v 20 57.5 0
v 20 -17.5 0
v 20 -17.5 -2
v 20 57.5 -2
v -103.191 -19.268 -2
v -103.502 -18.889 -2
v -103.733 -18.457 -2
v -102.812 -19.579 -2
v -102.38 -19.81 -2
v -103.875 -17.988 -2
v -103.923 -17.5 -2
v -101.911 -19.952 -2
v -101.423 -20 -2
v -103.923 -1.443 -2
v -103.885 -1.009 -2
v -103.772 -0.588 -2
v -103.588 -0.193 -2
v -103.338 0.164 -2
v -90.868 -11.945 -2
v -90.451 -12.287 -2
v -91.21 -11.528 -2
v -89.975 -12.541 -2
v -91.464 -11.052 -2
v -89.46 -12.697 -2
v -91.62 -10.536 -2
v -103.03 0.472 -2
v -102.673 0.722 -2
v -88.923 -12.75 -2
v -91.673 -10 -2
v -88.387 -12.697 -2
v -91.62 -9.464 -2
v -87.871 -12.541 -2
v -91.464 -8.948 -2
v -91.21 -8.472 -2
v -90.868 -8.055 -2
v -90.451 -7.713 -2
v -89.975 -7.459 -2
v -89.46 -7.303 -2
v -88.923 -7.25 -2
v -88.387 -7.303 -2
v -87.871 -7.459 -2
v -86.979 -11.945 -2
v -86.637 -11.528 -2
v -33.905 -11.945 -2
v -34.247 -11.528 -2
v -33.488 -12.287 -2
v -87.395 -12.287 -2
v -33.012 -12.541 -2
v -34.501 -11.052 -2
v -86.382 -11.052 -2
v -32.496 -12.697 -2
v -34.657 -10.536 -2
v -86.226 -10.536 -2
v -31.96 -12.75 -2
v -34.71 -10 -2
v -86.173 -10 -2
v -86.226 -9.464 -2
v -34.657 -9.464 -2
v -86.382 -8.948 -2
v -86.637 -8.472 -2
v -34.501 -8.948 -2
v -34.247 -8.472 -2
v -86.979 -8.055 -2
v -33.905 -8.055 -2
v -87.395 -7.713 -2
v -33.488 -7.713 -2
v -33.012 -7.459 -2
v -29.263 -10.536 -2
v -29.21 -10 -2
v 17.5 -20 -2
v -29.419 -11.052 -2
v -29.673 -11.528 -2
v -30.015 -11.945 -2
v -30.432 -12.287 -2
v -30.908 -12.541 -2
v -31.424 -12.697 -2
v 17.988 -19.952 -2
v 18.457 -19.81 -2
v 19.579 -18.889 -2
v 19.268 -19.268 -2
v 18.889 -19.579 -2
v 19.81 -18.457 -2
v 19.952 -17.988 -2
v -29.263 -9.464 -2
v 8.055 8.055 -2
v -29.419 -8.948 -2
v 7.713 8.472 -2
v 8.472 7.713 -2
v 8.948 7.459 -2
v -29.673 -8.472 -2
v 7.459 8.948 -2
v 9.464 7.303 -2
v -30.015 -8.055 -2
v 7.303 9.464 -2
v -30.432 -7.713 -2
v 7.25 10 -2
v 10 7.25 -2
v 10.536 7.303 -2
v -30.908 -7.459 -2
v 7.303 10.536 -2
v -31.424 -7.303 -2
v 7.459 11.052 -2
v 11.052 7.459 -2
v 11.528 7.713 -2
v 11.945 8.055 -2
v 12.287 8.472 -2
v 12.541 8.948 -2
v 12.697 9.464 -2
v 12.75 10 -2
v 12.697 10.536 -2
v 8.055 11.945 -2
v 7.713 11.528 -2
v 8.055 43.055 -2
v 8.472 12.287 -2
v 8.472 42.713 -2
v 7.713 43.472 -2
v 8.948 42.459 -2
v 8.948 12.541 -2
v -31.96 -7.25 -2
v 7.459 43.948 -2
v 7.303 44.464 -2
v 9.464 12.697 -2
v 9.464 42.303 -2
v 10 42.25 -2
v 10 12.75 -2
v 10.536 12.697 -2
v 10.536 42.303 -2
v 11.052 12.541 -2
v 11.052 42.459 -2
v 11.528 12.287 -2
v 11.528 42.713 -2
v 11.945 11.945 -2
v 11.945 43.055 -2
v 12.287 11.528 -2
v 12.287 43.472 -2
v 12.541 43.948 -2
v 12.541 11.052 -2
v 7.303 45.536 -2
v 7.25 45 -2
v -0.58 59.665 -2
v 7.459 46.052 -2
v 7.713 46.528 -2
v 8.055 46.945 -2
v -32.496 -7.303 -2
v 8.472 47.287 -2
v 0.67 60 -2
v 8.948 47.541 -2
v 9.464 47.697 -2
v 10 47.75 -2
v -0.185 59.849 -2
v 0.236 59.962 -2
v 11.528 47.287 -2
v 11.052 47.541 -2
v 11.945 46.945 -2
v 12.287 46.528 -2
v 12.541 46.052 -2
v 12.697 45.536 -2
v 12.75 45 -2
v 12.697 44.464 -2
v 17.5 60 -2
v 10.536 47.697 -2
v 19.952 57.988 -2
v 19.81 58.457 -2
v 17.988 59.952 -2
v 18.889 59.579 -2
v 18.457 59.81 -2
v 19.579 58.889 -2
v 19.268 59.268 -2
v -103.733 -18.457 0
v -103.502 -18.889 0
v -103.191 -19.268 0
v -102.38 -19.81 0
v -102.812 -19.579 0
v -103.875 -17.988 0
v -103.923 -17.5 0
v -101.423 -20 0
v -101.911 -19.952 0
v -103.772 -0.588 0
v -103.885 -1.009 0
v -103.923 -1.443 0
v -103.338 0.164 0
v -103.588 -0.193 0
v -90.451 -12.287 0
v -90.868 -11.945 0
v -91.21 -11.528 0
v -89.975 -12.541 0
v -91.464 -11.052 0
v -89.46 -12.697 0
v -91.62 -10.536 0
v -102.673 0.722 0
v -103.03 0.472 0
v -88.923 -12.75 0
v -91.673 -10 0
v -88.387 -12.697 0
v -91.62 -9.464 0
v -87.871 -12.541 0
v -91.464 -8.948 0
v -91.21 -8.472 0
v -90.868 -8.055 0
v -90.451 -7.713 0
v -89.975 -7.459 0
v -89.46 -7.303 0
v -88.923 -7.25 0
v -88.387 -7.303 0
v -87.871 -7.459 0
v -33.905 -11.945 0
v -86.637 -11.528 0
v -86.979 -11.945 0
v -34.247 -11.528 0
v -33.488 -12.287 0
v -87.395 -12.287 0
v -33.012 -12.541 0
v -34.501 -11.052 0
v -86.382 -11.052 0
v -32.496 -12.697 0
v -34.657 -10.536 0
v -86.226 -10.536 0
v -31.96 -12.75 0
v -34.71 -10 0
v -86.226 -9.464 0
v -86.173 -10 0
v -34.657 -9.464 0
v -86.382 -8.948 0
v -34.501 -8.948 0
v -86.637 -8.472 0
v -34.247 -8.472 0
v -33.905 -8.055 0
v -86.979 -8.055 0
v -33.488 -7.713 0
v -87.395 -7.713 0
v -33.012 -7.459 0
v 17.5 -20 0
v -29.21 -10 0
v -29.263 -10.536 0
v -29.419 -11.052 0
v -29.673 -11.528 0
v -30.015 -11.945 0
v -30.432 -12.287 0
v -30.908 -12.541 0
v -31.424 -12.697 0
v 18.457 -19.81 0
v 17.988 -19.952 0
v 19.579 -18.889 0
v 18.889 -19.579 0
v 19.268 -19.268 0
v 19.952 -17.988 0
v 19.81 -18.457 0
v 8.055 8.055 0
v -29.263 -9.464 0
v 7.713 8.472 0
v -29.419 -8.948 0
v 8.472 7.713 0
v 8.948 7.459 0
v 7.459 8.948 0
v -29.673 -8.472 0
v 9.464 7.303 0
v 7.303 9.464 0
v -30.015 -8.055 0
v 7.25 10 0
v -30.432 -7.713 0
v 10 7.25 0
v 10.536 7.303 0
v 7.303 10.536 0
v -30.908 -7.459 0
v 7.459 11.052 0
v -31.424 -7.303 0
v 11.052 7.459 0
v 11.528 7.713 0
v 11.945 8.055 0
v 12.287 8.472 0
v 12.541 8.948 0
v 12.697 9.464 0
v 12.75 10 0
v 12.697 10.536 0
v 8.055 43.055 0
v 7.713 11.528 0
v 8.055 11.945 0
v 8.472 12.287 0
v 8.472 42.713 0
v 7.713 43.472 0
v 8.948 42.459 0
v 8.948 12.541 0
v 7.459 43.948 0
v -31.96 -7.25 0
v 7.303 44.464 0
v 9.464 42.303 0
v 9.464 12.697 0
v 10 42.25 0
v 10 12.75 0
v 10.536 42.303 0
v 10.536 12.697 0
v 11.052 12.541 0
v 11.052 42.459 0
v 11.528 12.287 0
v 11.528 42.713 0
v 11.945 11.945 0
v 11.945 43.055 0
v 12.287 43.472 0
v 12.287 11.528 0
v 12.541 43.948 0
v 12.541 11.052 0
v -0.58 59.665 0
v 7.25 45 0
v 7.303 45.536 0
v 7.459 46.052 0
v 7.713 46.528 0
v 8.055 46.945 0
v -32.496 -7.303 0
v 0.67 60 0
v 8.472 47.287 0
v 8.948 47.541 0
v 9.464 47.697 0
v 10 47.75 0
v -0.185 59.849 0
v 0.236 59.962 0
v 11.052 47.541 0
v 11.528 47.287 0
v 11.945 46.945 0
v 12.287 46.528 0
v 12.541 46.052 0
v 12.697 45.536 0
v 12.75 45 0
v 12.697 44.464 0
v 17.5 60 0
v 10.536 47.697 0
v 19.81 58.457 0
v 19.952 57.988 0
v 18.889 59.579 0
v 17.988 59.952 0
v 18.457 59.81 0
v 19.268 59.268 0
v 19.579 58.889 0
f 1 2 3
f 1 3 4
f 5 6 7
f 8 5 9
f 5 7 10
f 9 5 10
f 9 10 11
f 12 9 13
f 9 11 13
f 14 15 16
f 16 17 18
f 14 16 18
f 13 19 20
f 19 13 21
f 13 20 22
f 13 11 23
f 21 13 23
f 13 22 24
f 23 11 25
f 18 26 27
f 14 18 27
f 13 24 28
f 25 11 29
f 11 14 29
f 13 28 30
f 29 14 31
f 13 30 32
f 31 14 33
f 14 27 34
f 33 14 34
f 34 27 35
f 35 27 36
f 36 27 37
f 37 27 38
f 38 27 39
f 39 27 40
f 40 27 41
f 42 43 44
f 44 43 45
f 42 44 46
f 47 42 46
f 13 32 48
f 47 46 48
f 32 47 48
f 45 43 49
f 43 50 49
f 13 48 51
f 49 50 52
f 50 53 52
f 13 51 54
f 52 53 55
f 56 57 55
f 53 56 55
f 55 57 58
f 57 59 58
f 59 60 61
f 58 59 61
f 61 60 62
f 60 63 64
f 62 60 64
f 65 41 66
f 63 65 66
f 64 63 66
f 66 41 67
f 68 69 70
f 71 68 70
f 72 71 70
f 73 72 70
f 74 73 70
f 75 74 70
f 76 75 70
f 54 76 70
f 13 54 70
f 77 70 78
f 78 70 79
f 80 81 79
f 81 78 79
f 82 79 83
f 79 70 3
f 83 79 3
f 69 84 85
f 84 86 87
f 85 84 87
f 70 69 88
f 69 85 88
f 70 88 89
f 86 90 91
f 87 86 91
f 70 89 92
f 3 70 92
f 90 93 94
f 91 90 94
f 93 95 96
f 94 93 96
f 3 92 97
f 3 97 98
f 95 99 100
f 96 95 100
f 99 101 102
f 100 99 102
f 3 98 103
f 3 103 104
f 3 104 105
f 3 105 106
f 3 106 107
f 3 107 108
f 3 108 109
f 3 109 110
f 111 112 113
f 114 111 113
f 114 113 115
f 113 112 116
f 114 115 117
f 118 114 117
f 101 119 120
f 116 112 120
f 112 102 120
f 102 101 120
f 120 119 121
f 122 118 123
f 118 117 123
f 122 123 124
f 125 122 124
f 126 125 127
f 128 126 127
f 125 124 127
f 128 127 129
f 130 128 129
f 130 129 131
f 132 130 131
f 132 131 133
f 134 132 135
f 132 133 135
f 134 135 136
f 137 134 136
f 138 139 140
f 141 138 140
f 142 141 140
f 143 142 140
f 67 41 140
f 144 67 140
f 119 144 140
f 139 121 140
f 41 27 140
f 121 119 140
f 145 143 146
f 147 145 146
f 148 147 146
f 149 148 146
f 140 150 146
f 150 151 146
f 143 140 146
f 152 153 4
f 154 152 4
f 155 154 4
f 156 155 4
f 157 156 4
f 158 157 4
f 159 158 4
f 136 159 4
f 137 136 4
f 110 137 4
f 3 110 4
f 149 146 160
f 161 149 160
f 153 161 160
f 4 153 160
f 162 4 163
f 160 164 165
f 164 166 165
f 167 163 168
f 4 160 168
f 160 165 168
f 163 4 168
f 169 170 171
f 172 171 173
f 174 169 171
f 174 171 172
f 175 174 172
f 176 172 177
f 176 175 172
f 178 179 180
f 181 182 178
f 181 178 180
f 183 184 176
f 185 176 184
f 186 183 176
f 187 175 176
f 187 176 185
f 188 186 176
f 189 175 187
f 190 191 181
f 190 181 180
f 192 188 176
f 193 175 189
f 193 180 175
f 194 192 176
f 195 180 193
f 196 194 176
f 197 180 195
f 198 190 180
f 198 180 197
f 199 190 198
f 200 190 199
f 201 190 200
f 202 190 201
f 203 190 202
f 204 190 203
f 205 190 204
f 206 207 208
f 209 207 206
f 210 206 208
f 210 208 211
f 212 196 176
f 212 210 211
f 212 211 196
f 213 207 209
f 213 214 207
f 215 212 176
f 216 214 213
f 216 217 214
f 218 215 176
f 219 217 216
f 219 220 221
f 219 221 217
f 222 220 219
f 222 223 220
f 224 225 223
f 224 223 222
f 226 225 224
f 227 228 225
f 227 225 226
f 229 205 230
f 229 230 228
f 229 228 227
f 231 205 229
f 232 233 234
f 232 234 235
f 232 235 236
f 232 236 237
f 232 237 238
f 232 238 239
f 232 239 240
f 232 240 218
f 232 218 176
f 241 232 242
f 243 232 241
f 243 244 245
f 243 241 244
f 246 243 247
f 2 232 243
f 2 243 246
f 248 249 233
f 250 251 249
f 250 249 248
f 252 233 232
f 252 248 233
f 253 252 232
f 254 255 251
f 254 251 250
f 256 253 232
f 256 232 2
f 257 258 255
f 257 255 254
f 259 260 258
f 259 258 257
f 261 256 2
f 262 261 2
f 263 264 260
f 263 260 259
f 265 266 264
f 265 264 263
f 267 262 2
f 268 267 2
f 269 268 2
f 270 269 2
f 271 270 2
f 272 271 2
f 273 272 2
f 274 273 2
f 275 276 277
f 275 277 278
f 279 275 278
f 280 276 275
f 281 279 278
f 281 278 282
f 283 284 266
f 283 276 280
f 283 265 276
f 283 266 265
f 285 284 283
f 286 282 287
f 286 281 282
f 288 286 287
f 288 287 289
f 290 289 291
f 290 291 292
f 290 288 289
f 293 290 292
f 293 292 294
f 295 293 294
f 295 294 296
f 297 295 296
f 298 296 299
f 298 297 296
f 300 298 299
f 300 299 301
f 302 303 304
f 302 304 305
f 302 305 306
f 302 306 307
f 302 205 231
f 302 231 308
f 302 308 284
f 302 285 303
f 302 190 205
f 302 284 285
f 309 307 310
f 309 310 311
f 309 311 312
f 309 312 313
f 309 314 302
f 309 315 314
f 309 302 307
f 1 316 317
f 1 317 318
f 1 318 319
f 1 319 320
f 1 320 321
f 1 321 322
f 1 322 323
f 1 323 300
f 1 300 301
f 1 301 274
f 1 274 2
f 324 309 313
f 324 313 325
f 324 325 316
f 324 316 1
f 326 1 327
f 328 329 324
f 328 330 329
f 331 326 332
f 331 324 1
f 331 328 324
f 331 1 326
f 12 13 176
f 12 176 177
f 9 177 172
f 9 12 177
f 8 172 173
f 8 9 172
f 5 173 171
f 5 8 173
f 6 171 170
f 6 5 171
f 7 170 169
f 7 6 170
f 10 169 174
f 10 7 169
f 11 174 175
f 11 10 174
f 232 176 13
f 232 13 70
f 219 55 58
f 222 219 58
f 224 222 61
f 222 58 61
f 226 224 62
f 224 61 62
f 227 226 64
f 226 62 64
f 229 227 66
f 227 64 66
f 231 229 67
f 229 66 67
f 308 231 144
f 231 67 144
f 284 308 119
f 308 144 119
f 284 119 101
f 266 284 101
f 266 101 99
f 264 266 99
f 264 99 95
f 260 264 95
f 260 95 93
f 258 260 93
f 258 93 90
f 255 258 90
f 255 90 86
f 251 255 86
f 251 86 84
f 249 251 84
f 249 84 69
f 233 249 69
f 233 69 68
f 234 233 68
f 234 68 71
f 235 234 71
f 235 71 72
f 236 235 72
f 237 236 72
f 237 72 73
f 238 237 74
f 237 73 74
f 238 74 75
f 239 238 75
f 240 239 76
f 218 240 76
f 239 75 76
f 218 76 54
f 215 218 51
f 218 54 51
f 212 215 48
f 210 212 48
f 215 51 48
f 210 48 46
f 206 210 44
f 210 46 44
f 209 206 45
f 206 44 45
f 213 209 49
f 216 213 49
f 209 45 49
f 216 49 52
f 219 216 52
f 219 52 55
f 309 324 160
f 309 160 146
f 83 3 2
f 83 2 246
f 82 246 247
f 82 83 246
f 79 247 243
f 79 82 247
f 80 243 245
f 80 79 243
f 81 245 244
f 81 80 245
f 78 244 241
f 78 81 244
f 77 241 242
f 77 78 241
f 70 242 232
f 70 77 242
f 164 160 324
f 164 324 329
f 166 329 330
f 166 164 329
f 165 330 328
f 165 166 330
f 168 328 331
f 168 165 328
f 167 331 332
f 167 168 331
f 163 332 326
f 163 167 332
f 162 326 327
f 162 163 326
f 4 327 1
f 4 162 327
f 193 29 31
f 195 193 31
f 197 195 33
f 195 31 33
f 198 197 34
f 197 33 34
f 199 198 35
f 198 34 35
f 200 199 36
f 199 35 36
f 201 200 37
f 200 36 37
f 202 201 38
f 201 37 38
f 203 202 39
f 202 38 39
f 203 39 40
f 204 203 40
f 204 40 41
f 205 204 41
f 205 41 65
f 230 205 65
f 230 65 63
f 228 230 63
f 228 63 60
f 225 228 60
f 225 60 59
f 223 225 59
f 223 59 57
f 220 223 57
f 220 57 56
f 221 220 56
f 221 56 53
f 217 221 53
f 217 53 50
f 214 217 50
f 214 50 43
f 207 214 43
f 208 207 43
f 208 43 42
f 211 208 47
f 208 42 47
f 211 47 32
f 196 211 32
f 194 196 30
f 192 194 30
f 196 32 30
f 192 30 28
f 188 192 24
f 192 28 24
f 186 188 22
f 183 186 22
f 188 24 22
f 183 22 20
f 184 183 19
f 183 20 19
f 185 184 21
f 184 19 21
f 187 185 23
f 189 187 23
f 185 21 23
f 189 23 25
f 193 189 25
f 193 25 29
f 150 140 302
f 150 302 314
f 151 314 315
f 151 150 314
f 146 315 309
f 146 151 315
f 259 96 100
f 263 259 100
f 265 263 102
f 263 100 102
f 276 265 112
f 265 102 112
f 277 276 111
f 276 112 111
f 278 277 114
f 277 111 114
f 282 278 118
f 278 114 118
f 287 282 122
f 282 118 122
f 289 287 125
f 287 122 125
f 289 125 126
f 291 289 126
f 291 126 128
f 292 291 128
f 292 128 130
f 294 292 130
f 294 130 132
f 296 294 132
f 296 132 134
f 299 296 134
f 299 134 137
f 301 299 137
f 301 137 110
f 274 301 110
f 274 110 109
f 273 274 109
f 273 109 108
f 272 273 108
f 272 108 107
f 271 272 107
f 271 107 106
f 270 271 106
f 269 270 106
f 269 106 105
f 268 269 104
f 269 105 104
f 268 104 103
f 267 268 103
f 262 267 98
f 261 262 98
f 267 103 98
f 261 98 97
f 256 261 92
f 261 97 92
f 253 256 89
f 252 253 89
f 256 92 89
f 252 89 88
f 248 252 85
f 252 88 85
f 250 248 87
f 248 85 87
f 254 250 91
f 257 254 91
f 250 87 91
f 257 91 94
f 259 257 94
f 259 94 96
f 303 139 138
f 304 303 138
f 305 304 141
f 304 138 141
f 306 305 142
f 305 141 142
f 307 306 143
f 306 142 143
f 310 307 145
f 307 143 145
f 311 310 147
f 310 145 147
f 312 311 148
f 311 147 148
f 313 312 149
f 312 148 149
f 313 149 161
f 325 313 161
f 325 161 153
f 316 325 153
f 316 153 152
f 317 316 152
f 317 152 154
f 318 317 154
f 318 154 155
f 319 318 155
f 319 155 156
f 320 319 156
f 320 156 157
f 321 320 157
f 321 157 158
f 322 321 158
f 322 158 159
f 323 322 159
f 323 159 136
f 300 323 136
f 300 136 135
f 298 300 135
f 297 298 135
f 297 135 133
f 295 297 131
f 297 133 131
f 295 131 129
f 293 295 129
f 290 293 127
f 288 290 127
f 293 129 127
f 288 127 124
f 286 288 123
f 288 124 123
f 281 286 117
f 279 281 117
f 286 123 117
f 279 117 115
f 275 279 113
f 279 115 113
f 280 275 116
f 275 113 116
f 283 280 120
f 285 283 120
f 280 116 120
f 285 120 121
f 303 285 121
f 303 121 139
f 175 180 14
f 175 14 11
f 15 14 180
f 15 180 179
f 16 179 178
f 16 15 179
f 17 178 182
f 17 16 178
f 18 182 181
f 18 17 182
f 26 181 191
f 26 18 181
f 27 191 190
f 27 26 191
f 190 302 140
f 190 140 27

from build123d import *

# Parameters (mm, degrees)
BASE_FLANGE1_DEPTH   = 2
M5_CLEARANCE_HOLE2_D = 5.5
BREAK_CORNER1_START  = -2
BREAK_CORNER1_DEPTH  = 2


# Read off the part's stored shape, not the designer's step: Break-Corner1
# Sheet-metal steps are written as plain solids
with BuildPart() as part:
    # Sketch2 → Base-Flange1 (new body)
    with BuildSketch(Plane.XY):
        Polygon((0, 60), (-103.923048454, 0), (-103.923048454, -20), (20, -20), (20, 0), (20, 60), align=None)
    extrude(amount=-BASE_FLANGE1_DEPTH)

    # M5 Clearance Hole2 (through all)
    with Locations(Plane.XY):
        with Locations((-88.923048454, -10), (-31.96, -10), (10, 10), (10, 45)):
            Hole(M5_CLEARANCE_HOLE2_D / 2)

    # Break-Corner1 outline → Break-Corner1 (cut)
    with BuildSketch(Plane.XY.offset(BREAK_CORNER1_START)):
        with BuildLine():
            ThreePointArc((17.5, 60), (19.267766953, 59.267766953), (20, 57.5))
            Line((20, 57.5), (20, 60))
            Line((20, 60), (17.5, 60))
        make_face()
        with BuildLine():
            Line((20, -20), (20, -17.5))
            ThreePointArc((20, -17.5), (19.267766953, -19.267766953), (17.5, -20))
            Line((17.5, -20), (20, -20))
        make_face()
        with BuildLine():
            ThreePointArc((-0.580127019, 59.665063509), (0.022825368, 59.914814566), (0.669872981, 60))
            Line((0.669872981, 60), (0, 60))
            Line((0, 60), (-0.580127019, 59.665063509))
        make_face()
        with BuildLine():
            Line((-103.923048454, -20), (-101.423048454, -20))
            ThreePointArc((-101.423048454, -20), (-103.190815407, -19.267766953), (-103.923048454, -17.5))
            Line((-103.923048454, -17.5), (-103.923048454, -20))
        make_face()
        with BuildLine():
            ThreePointArc((-103.923048454, -1.443375673), (-103.588111964, -0.193375673), (-102.673048454, 0.721687836))
            Line((-102.673048454, 0.721687836), (-103.923048454, 0))
            Line((-103.923048454, 0), (-103.923048454, -1.443375673))
        make_face()
    extrude(amount=BREAK_CORNER1_DEPTH, mode=Mode.SUBTRACT)


solid = part.part
